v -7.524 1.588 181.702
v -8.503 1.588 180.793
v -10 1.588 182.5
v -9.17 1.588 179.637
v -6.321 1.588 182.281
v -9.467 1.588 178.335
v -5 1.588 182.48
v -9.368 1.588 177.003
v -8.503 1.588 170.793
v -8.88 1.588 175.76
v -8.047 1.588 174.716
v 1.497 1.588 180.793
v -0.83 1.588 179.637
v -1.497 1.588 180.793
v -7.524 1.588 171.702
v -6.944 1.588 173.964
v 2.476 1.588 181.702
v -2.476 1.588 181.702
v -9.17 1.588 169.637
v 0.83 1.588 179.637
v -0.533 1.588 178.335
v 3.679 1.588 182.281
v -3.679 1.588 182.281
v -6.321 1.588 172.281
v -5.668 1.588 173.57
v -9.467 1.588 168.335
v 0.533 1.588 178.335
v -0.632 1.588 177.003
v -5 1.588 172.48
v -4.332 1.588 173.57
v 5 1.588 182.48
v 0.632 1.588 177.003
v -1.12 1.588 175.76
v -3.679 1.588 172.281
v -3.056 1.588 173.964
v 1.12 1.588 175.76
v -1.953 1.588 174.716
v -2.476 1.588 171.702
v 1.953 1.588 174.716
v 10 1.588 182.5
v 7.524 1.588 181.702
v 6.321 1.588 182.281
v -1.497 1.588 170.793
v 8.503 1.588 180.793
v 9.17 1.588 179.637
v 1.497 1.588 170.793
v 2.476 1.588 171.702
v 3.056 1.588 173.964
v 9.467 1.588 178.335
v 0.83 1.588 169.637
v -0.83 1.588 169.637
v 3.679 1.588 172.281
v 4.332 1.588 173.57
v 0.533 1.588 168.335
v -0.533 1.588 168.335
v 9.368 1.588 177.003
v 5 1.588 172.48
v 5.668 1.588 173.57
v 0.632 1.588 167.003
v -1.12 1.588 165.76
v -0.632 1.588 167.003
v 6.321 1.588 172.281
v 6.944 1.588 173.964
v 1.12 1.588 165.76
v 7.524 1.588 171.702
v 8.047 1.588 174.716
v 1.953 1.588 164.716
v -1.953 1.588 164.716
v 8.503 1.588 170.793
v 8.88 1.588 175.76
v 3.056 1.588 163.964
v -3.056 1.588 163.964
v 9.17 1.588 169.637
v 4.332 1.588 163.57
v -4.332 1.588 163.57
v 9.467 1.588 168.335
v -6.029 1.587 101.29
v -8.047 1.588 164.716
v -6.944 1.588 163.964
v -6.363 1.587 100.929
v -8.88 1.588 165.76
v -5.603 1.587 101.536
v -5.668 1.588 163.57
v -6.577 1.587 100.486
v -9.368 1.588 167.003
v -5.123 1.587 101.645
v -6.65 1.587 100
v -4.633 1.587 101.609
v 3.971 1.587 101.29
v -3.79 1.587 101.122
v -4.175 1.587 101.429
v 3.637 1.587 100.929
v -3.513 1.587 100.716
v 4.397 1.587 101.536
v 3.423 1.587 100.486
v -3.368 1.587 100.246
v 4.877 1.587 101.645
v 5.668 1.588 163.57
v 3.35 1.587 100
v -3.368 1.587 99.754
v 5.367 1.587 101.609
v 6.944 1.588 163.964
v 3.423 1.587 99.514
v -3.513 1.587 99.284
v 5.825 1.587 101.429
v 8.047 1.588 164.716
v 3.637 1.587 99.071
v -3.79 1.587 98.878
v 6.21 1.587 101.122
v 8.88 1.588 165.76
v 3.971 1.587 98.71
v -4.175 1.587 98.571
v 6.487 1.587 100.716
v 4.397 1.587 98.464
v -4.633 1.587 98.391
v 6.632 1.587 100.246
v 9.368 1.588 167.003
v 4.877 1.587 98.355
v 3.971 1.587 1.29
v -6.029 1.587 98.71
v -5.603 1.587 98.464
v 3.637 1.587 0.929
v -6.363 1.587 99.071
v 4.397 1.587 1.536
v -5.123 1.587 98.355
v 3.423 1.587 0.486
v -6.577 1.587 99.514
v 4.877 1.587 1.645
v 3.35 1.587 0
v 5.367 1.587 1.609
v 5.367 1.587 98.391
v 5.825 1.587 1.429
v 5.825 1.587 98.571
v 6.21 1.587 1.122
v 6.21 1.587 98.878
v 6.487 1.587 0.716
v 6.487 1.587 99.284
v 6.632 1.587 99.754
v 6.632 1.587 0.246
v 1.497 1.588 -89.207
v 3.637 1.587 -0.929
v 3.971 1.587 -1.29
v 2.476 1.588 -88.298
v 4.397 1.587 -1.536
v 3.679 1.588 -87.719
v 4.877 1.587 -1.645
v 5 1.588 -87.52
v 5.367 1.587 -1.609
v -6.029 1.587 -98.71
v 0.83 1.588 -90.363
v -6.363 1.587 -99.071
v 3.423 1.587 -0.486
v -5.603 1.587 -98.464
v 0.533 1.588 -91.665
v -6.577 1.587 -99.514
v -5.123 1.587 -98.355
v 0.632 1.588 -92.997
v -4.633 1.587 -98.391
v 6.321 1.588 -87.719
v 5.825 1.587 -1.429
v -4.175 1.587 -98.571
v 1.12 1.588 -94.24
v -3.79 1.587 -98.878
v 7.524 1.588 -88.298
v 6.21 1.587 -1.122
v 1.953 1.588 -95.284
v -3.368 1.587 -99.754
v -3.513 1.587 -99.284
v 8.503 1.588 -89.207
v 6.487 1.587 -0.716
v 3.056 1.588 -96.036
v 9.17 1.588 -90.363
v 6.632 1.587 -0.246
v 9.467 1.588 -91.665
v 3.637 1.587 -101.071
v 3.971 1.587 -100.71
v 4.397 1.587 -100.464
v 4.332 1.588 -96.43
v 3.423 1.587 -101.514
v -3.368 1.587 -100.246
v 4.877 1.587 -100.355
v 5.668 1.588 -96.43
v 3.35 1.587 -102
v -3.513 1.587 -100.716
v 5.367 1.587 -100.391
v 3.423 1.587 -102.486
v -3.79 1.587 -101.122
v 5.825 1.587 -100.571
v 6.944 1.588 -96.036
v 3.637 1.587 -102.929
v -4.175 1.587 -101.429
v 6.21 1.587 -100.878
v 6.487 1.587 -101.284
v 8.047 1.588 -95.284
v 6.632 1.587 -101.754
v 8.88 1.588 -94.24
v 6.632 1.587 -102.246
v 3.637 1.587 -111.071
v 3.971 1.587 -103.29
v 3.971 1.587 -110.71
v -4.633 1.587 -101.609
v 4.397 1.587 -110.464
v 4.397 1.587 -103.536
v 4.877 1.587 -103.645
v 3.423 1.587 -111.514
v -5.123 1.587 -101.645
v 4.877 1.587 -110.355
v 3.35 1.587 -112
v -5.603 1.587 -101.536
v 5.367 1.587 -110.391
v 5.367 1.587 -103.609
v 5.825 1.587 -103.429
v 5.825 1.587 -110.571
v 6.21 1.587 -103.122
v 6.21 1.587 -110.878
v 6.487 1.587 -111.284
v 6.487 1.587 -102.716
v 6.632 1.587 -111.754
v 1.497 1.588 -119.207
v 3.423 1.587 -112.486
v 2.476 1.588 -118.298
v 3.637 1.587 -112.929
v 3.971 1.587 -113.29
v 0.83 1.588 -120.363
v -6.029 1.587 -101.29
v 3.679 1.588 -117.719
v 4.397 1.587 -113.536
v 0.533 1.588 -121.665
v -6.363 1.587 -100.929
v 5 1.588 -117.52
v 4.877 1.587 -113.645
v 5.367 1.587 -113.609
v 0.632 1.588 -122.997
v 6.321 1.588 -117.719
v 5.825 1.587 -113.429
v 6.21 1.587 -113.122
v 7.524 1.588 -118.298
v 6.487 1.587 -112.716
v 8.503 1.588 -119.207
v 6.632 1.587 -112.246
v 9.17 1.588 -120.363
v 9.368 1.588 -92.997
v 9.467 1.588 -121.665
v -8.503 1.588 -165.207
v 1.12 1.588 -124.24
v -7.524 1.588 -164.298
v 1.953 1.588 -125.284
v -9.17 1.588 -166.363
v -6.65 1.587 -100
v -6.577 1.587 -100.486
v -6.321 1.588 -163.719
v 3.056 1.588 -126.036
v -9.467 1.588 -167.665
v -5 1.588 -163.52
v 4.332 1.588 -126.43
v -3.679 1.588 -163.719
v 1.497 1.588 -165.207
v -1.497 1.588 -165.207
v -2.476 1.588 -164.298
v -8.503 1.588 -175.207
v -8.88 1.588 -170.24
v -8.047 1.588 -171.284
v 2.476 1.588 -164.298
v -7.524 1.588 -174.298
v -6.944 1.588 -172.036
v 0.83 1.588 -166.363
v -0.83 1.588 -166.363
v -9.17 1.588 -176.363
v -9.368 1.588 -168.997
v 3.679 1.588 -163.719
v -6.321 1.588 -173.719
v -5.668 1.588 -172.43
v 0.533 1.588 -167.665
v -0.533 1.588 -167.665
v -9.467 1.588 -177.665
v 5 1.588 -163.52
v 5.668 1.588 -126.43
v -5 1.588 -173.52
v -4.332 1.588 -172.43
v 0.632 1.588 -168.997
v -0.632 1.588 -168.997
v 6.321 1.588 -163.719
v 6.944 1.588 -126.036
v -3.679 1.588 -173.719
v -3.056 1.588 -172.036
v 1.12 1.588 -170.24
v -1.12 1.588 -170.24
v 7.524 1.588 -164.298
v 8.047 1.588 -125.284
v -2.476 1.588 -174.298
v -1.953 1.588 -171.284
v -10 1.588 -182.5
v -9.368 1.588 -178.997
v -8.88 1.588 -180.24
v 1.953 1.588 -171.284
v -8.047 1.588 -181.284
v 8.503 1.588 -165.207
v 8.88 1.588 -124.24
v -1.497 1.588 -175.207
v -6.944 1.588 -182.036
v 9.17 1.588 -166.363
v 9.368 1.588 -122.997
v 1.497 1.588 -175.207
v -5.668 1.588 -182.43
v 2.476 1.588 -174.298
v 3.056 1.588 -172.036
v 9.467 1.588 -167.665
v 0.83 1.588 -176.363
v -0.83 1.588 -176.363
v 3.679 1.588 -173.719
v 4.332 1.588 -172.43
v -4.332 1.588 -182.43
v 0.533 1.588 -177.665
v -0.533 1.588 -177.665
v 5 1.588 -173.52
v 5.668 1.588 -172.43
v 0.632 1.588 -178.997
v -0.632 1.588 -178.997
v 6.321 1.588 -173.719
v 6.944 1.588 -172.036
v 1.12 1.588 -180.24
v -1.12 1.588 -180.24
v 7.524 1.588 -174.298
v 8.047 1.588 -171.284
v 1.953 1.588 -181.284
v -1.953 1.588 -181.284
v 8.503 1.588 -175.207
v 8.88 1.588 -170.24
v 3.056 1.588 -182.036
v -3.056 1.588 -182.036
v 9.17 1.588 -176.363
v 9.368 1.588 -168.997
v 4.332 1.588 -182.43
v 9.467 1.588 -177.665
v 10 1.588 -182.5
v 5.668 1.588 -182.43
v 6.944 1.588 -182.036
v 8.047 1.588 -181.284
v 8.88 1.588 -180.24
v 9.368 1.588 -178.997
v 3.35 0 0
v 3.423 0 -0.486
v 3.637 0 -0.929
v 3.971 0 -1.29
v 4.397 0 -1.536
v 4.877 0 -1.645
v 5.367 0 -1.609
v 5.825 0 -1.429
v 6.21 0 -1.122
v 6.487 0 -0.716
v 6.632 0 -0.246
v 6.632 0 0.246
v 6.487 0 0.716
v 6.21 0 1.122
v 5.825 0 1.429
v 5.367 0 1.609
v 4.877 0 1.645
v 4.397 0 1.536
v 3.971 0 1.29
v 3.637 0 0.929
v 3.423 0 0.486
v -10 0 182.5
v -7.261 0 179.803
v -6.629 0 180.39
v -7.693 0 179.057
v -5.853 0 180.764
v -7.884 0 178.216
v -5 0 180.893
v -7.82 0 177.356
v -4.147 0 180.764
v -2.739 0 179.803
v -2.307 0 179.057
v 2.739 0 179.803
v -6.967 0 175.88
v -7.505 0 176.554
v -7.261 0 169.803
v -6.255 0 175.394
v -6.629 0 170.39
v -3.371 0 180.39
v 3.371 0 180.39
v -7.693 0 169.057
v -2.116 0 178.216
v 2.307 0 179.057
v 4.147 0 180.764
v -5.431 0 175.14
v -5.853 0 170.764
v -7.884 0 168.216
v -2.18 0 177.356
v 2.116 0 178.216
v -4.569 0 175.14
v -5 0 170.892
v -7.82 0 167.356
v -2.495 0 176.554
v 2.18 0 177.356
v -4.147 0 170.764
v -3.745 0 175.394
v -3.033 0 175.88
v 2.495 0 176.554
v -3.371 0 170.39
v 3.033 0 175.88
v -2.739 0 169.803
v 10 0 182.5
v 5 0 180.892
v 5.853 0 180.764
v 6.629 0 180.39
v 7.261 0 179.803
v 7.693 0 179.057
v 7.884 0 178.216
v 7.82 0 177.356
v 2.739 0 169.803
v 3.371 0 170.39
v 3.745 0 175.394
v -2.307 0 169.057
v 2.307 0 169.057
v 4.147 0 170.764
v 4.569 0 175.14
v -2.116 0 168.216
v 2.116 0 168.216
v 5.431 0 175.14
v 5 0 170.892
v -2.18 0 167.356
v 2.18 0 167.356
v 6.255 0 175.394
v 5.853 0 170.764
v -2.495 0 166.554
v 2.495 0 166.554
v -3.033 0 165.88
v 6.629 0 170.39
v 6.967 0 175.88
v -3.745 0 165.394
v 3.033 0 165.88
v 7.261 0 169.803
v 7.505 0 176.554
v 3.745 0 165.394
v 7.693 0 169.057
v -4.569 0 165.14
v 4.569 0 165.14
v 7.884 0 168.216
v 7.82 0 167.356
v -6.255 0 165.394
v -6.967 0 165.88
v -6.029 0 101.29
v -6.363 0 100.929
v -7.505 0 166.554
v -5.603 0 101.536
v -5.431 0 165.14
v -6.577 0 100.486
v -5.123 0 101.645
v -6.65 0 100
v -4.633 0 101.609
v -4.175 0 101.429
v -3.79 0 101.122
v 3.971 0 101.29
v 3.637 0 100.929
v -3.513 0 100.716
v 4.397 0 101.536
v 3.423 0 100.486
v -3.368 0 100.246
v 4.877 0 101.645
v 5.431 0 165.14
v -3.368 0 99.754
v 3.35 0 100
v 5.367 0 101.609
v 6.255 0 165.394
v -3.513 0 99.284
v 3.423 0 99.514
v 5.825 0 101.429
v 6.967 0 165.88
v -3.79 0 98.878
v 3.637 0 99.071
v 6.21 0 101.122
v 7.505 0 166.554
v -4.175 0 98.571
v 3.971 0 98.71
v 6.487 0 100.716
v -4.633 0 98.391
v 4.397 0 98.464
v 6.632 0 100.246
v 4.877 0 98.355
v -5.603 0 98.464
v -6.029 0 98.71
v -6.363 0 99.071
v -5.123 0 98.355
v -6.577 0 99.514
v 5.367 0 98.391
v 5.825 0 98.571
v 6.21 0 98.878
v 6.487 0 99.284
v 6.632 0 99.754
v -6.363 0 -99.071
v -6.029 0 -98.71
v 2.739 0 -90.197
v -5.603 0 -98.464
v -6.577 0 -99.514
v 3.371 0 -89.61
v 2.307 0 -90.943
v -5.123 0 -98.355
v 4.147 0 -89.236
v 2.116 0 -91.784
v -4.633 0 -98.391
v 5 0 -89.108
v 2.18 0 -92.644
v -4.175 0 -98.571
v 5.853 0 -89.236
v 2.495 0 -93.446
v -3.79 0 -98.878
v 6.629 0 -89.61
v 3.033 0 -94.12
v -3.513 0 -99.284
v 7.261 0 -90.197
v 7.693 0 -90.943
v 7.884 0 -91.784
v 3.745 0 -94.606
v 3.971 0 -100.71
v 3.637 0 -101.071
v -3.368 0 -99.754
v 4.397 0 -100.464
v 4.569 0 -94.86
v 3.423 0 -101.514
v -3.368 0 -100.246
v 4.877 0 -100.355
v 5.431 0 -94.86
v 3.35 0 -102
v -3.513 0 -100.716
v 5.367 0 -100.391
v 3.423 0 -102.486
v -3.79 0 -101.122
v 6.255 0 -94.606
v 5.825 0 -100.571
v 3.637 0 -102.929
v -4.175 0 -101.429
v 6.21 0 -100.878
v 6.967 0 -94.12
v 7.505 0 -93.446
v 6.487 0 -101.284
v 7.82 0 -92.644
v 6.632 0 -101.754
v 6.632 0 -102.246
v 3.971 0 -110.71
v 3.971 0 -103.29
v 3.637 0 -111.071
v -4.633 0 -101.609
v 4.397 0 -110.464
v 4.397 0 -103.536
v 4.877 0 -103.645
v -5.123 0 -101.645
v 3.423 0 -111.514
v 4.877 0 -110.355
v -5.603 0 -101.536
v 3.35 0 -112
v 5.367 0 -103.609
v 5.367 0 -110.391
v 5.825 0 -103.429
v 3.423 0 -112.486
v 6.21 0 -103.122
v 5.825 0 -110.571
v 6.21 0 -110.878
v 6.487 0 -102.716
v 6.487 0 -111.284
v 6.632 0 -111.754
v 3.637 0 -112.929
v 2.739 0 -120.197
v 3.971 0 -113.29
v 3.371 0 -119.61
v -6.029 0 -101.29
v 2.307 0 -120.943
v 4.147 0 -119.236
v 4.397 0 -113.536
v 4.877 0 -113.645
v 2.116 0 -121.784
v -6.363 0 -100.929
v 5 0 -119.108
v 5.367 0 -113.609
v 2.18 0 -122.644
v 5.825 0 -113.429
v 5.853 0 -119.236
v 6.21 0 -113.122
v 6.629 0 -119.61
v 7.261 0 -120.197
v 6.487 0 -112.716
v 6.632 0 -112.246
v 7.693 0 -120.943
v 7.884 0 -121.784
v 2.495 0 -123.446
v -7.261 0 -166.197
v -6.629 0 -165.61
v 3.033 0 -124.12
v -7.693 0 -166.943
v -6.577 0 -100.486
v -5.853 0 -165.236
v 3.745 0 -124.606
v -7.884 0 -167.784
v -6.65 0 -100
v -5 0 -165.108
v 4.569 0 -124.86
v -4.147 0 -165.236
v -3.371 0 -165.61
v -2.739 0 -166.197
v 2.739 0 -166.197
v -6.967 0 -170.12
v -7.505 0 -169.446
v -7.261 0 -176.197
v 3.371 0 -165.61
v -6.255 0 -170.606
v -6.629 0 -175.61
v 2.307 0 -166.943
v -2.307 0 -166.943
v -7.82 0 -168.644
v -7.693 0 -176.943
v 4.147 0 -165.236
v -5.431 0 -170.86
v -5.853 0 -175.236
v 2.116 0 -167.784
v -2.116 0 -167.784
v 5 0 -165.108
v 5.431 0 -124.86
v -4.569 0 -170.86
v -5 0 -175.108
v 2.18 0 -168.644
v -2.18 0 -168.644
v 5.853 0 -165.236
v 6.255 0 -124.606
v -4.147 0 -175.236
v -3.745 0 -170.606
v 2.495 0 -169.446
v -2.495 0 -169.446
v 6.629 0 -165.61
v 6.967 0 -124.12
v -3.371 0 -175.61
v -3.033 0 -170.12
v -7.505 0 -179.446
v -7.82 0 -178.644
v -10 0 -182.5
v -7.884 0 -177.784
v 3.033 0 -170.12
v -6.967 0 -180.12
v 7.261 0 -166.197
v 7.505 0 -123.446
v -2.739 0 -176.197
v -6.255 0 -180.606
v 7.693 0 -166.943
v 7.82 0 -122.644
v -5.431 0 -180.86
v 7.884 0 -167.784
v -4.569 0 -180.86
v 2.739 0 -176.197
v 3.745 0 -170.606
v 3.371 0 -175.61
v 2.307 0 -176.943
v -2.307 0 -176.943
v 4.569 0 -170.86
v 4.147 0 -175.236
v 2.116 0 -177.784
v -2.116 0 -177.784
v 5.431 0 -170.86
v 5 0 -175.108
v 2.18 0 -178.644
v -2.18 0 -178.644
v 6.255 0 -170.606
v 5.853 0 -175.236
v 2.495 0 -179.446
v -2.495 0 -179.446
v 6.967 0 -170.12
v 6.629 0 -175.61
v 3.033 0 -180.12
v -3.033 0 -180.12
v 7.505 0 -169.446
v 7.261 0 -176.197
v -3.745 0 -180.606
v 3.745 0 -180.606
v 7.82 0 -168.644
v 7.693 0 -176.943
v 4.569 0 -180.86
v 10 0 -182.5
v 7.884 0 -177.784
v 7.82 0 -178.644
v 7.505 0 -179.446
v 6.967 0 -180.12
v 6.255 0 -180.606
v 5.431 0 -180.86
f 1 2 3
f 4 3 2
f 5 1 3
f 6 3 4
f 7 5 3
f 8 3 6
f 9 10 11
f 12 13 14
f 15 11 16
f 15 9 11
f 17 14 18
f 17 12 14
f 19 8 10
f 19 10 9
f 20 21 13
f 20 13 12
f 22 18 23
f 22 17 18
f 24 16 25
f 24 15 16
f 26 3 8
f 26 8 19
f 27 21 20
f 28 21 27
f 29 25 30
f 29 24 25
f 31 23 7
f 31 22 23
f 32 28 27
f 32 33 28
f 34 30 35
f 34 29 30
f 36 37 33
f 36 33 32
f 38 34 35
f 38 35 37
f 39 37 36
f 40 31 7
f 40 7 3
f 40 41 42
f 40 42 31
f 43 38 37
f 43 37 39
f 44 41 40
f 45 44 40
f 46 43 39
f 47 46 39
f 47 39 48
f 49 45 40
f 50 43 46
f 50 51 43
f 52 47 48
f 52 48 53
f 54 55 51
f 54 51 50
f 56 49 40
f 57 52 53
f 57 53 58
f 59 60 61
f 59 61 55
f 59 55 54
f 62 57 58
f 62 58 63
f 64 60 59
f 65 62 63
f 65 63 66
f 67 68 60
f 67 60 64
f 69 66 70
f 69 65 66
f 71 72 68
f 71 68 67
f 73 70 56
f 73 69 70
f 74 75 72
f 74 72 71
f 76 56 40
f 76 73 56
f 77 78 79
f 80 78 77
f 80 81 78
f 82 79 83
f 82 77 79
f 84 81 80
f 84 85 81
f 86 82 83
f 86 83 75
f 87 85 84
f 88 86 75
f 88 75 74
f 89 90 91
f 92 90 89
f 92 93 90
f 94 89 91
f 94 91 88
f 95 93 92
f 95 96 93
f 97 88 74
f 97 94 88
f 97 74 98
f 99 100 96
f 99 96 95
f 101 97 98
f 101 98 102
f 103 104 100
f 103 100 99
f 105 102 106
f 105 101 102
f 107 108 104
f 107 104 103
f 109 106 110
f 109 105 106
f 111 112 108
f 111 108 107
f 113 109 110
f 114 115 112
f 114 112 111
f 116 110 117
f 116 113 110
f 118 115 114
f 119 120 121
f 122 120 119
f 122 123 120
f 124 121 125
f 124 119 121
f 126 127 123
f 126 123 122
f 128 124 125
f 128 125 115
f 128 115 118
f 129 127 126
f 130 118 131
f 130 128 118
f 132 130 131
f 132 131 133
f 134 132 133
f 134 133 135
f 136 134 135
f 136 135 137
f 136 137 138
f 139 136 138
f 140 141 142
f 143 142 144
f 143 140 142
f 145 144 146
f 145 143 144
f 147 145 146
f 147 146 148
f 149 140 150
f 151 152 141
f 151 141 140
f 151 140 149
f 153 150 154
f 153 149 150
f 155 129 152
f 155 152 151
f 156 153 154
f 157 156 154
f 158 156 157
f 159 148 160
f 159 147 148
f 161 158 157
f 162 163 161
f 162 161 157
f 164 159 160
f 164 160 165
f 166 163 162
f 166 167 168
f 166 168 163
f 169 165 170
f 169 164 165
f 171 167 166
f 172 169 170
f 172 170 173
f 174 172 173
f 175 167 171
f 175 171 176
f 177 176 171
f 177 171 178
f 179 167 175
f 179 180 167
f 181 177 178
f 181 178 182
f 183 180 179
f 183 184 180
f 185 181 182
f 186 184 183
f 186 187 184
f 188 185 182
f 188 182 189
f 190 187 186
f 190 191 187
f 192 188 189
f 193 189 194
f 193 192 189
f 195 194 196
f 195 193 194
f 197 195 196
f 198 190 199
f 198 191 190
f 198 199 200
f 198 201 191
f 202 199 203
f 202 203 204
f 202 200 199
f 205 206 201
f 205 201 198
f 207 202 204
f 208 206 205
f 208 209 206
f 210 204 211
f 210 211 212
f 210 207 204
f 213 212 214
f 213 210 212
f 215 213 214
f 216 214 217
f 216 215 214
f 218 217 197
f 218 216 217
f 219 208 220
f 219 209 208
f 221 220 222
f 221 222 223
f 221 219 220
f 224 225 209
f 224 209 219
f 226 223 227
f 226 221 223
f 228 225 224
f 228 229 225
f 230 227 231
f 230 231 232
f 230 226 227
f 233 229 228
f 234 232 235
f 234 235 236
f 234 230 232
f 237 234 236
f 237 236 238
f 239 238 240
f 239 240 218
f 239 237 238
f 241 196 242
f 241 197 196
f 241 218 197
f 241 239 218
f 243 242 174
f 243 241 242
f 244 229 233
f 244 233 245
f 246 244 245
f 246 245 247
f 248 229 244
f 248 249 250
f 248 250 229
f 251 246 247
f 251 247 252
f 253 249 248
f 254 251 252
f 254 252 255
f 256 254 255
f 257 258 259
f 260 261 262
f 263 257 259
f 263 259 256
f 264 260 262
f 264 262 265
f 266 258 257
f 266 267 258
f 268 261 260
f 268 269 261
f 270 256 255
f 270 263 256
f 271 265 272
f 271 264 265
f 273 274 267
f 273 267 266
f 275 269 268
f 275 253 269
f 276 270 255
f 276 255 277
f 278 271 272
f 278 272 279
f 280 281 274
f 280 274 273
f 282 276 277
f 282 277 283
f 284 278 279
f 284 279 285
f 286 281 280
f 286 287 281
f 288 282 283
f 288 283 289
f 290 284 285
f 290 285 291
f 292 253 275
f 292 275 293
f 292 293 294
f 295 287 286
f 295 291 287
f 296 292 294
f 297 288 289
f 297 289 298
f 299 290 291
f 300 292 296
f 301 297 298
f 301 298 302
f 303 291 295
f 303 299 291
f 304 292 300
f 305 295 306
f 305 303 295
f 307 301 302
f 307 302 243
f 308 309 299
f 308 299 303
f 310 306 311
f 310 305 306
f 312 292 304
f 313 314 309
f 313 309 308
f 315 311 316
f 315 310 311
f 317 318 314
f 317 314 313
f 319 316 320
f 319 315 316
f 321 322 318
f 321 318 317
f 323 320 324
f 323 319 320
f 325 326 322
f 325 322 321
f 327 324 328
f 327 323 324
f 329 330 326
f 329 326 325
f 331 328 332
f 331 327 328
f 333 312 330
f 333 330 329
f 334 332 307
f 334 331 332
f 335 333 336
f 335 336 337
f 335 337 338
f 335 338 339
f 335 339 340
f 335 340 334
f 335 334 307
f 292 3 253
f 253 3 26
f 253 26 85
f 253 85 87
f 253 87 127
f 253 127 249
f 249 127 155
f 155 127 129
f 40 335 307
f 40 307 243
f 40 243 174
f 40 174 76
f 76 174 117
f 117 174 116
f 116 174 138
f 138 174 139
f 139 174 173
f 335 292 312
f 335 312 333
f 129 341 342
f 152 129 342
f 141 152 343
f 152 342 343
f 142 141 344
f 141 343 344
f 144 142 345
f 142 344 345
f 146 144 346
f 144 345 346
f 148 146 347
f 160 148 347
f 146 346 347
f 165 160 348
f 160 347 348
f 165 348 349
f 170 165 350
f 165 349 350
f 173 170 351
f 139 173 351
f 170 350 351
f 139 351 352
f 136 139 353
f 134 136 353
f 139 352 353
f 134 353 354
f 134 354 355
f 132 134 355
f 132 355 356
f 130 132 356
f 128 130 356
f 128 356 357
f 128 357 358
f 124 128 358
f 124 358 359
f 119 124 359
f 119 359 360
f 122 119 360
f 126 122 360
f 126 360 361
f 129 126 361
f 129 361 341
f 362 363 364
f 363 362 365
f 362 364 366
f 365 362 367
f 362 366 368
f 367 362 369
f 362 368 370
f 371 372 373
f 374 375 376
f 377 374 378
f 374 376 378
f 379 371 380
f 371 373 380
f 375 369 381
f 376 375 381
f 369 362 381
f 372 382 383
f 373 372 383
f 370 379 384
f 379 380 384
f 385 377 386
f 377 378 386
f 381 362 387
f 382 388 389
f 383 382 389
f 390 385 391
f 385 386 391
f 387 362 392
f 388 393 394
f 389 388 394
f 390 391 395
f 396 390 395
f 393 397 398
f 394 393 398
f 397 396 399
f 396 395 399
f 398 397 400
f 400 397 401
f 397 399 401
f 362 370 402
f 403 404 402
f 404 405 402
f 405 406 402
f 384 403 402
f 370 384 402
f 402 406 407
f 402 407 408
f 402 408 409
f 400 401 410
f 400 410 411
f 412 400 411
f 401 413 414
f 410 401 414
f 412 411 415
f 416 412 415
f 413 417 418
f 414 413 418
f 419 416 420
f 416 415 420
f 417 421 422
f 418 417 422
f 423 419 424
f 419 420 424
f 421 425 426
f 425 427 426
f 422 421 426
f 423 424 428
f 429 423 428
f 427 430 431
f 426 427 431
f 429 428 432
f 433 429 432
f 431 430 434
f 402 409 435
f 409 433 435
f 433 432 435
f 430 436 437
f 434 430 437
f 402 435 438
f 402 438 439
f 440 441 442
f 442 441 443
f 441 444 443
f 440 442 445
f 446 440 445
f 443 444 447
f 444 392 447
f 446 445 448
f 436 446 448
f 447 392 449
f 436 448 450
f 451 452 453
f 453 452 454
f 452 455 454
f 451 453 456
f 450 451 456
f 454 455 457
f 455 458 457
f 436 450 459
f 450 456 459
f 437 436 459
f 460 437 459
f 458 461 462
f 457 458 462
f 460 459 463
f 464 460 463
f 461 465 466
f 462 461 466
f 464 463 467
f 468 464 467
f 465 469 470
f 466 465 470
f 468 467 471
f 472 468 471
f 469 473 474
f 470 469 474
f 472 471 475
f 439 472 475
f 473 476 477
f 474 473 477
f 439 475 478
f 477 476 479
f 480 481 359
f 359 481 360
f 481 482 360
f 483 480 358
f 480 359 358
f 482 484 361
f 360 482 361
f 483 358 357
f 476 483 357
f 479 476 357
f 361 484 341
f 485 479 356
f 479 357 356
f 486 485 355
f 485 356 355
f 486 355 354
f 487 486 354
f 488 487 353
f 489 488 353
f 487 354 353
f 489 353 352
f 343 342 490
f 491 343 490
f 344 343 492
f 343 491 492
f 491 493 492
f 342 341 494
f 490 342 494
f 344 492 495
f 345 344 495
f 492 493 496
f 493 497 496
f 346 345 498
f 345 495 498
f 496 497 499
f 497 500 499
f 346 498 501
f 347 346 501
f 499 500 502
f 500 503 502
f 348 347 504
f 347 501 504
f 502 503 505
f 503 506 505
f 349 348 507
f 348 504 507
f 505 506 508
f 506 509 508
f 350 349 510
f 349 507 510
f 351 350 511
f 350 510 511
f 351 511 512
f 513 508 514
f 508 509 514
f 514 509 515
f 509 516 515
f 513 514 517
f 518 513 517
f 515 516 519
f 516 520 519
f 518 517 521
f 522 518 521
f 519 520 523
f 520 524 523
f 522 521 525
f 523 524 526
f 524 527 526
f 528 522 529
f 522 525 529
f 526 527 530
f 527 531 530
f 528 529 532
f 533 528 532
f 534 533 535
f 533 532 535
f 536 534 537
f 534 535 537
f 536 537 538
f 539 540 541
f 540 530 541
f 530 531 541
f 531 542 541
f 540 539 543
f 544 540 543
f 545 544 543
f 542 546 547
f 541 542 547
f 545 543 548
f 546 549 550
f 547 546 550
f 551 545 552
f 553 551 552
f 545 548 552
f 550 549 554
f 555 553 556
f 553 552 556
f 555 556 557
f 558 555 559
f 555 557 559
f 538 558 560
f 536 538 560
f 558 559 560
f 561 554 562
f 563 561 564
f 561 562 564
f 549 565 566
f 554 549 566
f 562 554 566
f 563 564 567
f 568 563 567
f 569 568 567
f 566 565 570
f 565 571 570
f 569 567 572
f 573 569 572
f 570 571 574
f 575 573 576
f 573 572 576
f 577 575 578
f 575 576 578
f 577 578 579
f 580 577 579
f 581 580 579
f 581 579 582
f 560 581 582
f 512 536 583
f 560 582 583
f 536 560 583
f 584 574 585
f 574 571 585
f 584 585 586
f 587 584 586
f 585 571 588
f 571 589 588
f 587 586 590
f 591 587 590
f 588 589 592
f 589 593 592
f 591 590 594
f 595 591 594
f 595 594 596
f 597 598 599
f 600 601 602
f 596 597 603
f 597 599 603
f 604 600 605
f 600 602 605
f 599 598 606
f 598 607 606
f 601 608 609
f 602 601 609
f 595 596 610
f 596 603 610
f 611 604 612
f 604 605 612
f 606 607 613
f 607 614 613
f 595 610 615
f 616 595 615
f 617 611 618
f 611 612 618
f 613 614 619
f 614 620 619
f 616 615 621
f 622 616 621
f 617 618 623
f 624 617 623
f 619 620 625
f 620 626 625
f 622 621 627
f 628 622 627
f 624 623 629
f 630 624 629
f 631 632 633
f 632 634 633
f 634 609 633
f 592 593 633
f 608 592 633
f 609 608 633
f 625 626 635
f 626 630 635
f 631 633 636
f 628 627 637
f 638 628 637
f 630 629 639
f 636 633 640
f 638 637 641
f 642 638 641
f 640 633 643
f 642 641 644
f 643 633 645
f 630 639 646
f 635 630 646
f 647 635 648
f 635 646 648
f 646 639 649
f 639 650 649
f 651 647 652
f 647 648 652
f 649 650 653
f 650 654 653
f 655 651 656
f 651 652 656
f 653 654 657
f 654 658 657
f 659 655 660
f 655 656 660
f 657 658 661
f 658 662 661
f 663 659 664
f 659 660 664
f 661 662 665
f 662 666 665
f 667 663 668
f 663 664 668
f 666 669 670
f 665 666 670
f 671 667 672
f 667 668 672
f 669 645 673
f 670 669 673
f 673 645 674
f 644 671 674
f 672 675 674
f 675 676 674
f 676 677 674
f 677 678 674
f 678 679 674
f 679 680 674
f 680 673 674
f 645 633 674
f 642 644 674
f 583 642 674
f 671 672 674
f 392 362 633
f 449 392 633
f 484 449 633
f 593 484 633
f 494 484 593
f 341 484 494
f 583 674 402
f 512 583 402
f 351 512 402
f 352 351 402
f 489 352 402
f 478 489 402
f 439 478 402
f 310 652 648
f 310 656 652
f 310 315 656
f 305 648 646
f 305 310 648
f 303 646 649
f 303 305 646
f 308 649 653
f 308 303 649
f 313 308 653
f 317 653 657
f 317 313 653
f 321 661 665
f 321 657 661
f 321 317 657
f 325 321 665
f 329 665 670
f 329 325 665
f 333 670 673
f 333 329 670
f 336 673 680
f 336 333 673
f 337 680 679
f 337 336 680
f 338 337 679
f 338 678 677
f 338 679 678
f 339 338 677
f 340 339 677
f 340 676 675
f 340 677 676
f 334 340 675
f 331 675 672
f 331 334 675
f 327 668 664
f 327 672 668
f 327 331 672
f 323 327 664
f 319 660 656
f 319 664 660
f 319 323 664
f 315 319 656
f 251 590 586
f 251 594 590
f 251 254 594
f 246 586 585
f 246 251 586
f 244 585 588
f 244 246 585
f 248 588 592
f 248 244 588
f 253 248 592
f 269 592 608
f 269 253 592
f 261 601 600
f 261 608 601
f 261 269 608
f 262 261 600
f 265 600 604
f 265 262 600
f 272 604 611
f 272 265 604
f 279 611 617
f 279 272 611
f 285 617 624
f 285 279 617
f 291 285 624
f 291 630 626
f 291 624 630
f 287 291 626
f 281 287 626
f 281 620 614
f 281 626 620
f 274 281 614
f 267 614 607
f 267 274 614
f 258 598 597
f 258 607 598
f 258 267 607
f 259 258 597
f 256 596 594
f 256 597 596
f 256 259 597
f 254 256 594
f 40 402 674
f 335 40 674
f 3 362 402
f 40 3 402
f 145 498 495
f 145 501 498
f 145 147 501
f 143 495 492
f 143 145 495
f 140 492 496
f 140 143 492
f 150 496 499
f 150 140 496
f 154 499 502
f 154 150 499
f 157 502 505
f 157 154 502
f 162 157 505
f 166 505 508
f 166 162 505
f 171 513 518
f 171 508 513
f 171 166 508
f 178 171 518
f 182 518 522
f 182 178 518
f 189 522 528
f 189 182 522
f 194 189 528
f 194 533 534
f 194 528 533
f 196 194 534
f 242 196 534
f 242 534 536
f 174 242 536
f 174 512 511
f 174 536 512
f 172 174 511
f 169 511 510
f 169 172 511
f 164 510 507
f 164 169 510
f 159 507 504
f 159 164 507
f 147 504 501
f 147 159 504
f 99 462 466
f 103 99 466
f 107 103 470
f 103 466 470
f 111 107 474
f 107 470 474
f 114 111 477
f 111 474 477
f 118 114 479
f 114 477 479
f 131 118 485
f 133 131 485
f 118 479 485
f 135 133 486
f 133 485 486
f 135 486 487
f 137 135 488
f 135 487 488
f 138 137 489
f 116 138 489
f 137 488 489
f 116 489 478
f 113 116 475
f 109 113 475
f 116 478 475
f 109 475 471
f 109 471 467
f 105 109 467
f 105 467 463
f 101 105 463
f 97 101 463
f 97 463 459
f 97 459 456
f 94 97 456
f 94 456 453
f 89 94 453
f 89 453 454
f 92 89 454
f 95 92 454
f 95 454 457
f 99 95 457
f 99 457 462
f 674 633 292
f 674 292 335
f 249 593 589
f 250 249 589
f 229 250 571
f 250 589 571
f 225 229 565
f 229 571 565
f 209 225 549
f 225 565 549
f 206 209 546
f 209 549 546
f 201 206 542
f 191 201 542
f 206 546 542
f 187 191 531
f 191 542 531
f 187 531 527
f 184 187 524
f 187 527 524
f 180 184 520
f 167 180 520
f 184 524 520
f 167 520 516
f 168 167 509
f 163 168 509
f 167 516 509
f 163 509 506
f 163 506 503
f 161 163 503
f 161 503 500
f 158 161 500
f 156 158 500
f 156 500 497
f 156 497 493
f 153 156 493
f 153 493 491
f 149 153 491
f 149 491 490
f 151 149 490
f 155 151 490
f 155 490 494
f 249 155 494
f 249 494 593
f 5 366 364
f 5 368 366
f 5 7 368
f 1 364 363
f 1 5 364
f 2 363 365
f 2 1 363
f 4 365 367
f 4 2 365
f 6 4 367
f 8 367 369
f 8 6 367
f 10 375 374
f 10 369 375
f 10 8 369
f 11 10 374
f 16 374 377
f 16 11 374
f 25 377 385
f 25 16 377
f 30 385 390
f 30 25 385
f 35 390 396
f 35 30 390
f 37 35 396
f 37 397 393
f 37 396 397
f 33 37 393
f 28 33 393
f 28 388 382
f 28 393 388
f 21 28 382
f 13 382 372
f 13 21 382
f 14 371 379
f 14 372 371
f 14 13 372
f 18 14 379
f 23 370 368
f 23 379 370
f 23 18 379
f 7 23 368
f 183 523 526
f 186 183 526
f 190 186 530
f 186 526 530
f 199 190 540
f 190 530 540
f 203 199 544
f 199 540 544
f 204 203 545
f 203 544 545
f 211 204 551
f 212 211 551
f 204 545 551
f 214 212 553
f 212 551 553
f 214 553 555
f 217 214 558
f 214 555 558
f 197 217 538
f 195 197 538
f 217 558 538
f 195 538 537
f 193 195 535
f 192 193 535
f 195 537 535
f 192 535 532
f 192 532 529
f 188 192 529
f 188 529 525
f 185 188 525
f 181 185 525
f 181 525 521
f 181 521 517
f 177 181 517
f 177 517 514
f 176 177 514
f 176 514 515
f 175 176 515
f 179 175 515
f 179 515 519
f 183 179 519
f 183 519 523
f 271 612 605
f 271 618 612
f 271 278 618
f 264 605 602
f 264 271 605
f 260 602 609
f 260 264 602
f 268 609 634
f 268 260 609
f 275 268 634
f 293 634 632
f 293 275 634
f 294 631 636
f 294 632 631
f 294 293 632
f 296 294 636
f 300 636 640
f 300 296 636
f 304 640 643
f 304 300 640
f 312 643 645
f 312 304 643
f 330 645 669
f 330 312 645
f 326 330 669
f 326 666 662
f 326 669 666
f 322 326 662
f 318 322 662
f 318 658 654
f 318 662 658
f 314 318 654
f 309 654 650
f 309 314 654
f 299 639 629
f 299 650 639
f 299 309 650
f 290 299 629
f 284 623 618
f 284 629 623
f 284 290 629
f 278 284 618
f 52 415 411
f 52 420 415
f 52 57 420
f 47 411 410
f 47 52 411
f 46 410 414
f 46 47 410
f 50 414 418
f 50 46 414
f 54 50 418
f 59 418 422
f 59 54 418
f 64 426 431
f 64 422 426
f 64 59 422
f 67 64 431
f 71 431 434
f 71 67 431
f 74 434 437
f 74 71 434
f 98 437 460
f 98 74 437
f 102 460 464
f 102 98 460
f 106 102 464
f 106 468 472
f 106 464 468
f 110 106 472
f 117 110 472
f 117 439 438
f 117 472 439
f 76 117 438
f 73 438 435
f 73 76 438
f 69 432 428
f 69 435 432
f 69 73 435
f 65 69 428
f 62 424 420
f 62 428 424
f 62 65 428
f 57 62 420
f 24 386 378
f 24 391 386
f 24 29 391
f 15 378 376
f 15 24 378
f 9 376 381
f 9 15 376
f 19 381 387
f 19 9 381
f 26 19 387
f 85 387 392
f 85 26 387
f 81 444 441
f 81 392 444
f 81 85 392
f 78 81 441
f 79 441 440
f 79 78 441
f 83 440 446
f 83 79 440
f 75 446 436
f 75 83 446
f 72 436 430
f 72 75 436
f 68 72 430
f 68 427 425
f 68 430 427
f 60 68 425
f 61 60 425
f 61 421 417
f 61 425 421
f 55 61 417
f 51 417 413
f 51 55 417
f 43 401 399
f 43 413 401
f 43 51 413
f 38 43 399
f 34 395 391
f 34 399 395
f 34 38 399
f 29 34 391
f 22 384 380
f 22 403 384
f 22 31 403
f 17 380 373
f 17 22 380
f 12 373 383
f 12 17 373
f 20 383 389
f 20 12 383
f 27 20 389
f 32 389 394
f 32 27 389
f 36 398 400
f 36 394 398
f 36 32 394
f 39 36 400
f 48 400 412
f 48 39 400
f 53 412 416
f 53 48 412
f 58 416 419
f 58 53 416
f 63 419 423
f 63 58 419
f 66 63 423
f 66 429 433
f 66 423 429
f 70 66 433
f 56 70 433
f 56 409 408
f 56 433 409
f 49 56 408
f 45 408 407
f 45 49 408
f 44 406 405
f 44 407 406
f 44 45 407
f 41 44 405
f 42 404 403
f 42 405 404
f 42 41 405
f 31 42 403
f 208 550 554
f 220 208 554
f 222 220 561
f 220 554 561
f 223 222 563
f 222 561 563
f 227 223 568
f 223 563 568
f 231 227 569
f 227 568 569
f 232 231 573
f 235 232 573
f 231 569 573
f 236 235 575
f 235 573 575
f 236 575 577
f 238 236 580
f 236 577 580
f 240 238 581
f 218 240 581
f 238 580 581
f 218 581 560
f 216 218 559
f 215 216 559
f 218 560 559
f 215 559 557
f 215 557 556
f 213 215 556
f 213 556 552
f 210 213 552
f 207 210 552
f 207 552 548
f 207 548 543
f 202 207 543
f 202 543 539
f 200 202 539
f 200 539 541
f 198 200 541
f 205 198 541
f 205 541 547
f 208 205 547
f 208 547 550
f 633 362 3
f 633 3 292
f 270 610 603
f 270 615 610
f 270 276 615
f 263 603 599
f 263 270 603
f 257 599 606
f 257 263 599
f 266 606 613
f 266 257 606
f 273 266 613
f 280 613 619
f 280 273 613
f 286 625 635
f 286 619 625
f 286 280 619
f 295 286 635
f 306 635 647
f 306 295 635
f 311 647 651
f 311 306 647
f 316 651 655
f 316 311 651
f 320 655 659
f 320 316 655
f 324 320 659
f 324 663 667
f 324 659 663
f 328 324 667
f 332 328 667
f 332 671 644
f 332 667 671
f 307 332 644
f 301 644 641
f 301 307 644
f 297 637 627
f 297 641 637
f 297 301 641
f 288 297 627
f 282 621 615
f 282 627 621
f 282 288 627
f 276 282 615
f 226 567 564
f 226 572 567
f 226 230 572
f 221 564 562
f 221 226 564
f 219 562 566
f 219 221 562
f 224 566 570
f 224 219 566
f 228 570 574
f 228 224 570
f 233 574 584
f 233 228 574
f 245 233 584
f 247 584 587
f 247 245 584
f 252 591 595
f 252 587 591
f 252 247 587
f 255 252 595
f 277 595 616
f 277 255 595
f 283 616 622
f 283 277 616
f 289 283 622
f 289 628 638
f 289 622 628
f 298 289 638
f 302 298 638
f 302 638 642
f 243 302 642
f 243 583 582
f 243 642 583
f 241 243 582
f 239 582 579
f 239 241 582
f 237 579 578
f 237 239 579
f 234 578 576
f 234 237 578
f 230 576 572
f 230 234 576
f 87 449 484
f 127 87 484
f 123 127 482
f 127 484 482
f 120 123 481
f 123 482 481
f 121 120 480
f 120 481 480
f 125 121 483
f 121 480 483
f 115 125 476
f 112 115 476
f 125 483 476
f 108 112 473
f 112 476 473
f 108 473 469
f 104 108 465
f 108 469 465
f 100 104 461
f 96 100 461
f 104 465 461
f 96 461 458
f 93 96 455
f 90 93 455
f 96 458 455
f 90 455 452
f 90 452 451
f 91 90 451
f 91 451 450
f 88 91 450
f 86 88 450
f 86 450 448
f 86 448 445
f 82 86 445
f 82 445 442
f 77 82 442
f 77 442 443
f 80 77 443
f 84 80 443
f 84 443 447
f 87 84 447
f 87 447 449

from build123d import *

# Parameters (mm, degrees)
SKETCH1_W                     = 20
SKETCH1_H                     = 365
BOSS_EXTRUDE1_DEPTH           = 1.5875
CSK_FOR_M4_SFHCS1_AT_2_COUNT  = 2
CSK_FOR_M4_SFHCS1_AT_2_PITCH  = 14.142135624
CSK_FOR_M4_SFHCS1_AT_3_COUNT  = 2
CSK_FOR_M4_SFHCS1_AT_3_PITCH  = 10
CSK_FOR_M4_SFHCS1_AT_4_COUNT  = 2
CSK_FOR_M4_SFHCS1_AT_4_PITCH  = 10
CSK_FOR_M4_SFHCS1_AT_5_COUNT  = 2
CSK_FOR_M4_SFHCS1_AT_5_PITCH  = 346
CSK_FOR_M4_SFHCS1_AT_6_COUNT  = 2
CSK_FOR_M4_SFHCS1_AT_6_PITCH  = 336.148776586
CSK_FOR_M4_SFHCS1_AT_7_COUNT  = 2
CSK_FOR_M4_SFHCS1_AT_7_PITCH  = 346.144478506
CSK_FOR_M4_SFHCS1_AT_8_COUNT  = 2
CSK_FOR_M4_SFHCS1_AT_8_PITCH  = 336
CSK_FOR_M4_SFHCS1_AT_9_COUNT  = 2
CSK_FOR_M4_SFHCS1_AT_9_PITCH  = 260
CSK_FOR_M4_SFHCS1_AT_10_COUNT = 2
CSK_FOR_M4_SFHCS1_AT_10_PITCH = 290
M4X0_7_TAPPED_HOLE1_D         = 3.3


with BuildPart() as part:
    # Sketch1 → Boss-Extrude1 (new body)
    with BuildSketch(Plane(origin=(0, 0, 0), x_dir=(1, 0, 0), z_dir=(0, 1, 0))):
        Rectangle(SKETCH1_W, SKETCH1_H)
    extrude(amount=BOSS_EXTRUDE1_DEPTH)

    # Sketch3 → CSK for M4 SFHCS1 (revolve, cut)
    with BuildSketch(Plane(origin=(5, 1.5875, 168), x_dir=(0, 0, 1), z_dir=(1, 0, 0))):
        Polygon((0, 0), (0, 1.5875), (2.25, 1.5875), (2.25, 2.23), (4.48, 0), align=None)
    csk_for_m4_sfhcs1 = revolve(axis=Axis((5, 7.9375, 168), (0, -1, 0)), mode=Mode.SUBTRACT)

    # CSK for M4 SFHCS1 at 2: CSK for M4 SFHCS1 ×2
    with Locations(*[Vector(-0.7071067811865469, 0, 0.7071067811865482) * (i * CSK_FOR_M4_SFHCS1_AT_2_PITCH) for i in range(1, CSK_FOR_M4_SFHCS1_AT_2_COUNT)]):
        add(csk_for_m4_sfhcs1, mode=Mode.SUBTRACT)

    # CSK for M4 SFHCS1 at 3: CSK for M4 SFHCS1 ×2
    with Locations(*[(-i * CSK_FOR_M4_SFHCS1_AT_3_PITCH, 0, 0) for i in range(1, CSK_FOR_M4_SFHCS1_AT_3_COUNT)]):
        add(csk_for_m4_sfhcs1, mode=Mode.SUBTRACT)

    # CSK for M4 SFHCS1 at 4: CSK for M4 SFHCS1 ×2
    with Locations(*[(0, 0, i * CSK_FOR_M4_SFHCS1_AT_4_PITCH) for i in range(1, CSK_FOR_M4_SFHCS1_AT_4_COUNT)]):
        add(csk_for_m4_sfhcs1, mode=Mode.SUBTRACT)

    # CSK for M4 SFHCS1 at 5: CSK for M4 SFHCS1 ×2
    with Locations(*[(0, 0, -i * CSK_FOR_M4_SFHCS1_AT_5_PITCH) for i in range(1, CSK_FOR_M4_SFHCS1_AT_5_COUNT)]):
        add(csk_for_m4_sfhcs1, mode=Mode.SUBTRACT)

    # CSK for M4 SFHCS1 at 6: CSK for M4 SFHCS1 ×2
    with Locations(*[Vector(-0.029748732396333223, 0, -0.9995574085167952) * (i * CSK_FOR_M4_SFHCS1_AT_6_PITCH) for i in range(1, CSK_FOR_M4_SFHCS1_AT_6_COUNT)]):
        add(csk_for_m4_sfhcs1, mode=Mode.SUBTRACT)

    # CSK for M4 SFHCS1 at 7: CSK for M4 SFHCS1 ×2
    with Locations(*[Vector(-0.028889670703889703, 0, -0.9995826063545828) * (i * CSK_FOR_M4_SFHCS1_AT_7_PITCH) for i in range(1, CSK_FOR_M4_SFHCS1_AT_7_COUNT)]):
        add(csk_for_m4_sfhcs1, mode=Mode.SUBTRACT)

    # CSK for M4 SFHCS1 at 8: CSK for M4 SFHCS1 ×2
    with Locations(*[(0, 0, -i * CSK_FOR_M4_SFHCS1_AT_8_PITCH) for i in range(1, CSK_FOR_M4_SFHCS1_AT_8_COUNT)]):
        add(csk_for_m4_sfhcs1, mode=Mode.SUBTRACT)

    # CSK for M4 SFHCS1 at 9: CSK for M4 SFHCS1 ×2
    with Locations(*[(0, 0, -i * CSK_FOR_M4_SFHCS1_AT_9_PITCH) for i in range(1, CSK_FOR_M4_SFHCS1_AT_9_COUNT)]):
        add(csk_for_m4_sfhcs1, mode=Mode.SUBTRACT)

    # CSK for M4 SFHCS1 at 10: CSK for M4 SFHCS1 ×2
    with Locations(*[(0, 0, -i * CSK_FOR_M4_SFHCS1_AT_10_PITCH) for i in range(1, CSK_FOR_M4_SFHCS1_AT_10_COUNT)]):
        add(csk_for_m4_sfhcs1, mode=Mode.SUBTRACT)

    # M4x0.7 Tapped Hole1 (through all)
    with Locations(Plane(origin=(0, 1.5875, 0), x_dir=(1, 0, 0), z_dir=(0, 1, 0))):
        with Locations((-5, -100), (-5, 100), (5, -100), (5, 0), (5, 102), (5, 112)):
            Hole(M4X0_7_TAPPED_HOLE1_D / 2)


solid = part.part
